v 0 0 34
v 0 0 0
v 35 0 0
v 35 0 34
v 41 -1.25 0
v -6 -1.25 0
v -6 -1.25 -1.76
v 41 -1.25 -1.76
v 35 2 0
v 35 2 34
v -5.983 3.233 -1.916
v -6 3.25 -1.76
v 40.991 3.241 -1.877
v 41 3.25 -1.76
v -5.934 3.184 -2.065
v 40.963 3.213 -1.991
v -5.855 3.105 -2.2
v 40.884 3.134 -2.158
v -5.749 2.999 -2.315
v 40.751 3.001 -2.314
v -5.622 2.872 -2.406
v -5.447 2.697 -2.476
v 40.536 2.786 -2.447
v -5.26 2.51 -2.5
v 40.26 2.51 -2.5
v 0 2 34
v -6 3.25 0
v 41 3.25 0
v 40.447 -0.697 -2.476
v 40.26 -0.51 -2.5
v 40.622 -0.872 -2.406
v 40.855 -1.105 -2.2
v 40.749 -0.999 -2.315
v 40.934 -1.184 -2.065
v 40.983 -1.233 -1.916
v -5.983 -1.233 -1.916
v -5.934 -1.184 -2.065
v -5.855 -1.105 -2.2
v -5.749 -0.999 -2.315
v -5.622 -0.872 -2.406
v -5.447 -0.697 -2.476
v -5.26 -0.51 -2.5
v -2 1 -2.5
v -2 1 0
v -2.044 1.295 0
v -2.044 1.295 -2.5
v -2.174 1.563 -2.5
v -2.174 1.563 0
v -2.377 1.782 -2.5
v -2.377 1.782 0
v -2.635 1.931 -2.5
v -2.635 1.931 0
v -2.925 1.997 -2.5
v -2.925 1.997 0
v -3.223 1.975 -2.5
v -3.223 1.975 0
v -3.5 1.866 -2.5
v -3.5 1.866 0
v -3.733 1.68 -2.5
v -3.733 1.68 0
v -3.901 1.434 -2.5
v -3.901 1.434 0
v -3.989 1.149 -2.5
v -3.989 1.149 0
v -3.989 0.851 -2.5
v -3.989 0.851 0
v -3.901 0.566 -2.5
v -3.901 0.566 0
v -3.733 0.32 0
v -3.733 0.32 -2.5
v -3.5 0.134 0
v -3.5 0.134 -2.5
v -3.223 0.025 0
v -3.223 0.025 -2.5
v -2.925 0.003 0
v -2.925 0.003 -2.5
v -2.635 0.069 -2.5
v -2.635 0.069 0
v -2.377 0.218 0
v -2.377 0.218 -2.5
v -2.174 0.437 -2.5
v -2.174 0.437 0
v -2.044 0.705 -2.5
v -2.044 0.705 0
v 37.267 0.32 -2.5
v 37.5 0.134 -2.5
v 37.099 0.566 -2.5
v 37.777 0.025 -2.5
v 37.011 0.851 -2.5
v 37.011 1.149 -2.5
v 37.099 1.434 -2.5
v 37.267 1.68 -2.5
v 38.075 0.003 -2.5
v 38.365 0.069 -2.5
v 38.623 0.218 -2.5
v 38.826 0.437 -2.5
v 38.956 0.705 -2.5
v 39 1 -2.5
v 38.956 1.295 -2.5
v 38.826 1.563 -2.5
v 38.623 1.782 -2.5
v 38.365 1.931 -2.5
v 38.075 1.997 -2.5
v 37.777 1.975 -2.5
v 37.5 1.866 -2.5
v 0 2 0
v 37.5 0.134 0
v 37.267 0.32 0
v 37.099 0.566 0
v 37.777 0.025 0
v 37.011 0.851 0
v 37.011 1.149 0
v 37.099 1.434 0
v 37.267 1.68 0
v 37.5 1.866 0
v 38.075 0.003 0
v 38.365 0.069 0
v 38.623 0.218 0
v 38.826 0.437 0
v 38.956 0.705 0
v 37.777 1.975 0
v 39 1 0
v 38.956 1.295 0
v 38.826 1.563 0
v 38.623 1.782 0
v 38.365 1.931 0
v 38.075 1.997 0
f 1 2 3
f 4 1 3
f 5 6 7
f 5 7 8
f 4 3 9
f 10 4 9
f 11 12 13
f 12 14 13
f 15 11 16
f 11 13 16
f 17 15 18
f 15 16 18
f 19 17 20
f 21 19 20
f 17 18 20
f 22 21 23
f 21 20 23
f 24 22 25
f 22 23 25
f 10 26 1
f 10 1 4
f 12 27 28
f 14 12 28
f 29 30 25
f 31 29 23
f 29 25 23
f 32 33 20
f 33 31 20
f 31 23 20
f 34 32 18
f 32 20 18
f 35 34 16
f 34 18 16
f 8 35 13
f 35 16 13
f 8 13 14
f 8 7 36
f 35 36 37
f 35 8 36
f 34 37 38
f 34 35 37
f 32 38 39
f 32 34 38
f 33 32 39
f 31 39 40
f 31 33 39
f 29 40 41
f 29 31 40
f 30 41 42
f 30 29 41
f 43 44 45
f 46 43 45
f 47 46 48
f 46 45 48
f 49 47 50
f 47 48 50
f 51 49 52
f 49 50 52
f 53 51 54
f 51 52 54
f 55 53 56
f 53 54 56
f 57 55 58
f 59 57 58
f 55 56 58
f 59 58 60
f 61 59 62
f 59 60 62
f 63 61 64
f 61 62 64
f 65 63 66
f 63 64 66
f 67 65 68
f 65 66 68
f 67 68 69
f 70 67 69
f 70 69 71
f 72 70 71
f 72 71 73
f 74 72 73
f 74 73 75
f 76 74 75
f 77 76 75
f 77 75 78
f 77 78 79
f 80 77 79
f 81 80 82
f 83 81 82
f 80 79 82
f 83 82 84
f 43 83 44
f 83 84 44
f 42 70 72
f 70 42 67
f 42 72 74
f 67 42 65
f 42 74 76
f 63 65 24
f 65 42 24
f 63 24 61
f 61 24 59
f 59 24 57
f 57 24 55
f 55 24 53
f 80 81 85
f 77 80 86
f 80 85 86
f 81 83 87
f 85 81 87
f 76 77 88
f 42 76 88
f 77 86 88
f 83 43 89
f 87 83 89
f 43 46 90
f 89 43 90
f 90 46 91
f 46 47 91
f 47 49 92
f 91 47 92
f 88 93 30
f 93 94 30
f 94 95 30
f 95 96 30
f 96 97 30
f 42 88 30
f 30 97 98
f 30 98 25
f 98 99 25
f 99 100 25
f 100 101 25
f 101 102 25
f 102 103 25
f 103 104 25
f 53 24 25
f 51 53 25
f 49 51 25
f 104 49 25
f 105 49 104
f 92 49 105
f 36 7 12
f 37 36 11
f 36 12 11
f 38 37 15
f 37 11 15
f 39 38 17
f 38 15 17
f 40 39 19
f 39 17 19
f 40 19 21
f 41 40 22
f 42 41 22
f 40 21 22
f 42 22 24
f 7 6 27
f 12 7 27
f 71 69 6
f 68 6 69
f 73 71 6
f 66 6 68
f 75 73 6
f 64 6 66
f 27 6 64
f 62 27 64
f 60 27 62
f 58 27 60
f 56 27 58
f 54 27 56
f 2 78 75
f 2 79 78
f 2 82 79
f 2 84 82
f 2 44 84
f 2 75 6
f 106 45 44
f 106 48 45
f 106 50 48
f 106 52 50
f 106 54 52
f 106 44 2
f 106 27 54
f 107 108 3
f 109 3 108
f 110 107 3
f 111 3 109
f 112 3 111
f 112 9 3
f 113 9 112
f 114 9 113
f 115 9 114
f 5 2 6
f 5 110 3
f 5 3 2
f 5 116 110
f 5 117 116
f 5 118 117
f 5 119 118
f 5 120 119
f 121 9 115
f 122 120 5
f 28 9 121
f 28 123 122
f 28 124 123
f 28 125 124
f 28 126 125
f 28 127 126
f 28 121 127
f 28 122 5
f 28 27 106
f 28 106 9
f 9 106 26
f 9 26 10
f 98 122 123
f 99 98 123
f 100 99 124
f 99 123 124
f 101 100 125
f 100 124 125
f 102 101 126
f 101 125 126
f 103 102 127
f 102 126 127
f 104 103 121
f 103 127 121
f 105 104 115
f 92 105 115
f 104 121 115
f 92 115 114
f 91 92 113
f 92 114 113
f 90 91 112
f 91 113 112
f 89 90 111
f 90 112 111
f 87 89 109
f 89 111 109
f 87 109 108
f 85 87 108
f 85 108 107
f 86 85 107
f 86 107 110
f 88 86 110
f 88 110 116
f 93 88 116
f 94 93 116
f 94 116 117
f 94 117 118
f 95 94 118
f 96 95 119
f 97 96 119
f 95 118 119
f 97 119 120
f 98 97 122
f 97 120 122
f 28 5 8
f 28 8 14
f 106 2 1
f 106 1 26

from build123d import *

# Parameters (mm, degrees)
F0_W     = 35
F0_H     = 2
F1_DEPTH = 34
F2_W     = 47
F2_H     = 4.5
F2_R     = 1
F3_DEPTH = 2.5
F4_R     = 0.74


with BuildPart() as f1:
    # F0 (on Top) → F1 (new body)
    with BuildSketch(Plane.XY):
        with Locations((17.5, 1)):
            Rectangle(F0_W, F0_H)
    extrude(amount=F1_DEPTH)

    # F2 (on Top) → F3 (join)
    with BuildSketch(Plane.XY):
        with Locations((17.5, 1)):
            Rectangle(F2_W, F2_H)
        with Locations((-3, 1)):
            Circle(F2_R, mode=Mode.SUBTRACT)
        with Locations((38, 1)):
            Circle(F2_R, mode=Mode.SUBTRACT)
    extrude(amount=-F3_DEPTH)

    # F4
    f4_edges = [f1.edges().sort_by_distance(p)[0] for p in [
        (-6, 1, -2.5),
        (17.5, -1.25, -2.5),
        (41, 1, -2.5),
        (17.5, 3.25, -2.5),
    ]]
    fillet(f4_edges, radius=F4_R)


solid = f1.part
